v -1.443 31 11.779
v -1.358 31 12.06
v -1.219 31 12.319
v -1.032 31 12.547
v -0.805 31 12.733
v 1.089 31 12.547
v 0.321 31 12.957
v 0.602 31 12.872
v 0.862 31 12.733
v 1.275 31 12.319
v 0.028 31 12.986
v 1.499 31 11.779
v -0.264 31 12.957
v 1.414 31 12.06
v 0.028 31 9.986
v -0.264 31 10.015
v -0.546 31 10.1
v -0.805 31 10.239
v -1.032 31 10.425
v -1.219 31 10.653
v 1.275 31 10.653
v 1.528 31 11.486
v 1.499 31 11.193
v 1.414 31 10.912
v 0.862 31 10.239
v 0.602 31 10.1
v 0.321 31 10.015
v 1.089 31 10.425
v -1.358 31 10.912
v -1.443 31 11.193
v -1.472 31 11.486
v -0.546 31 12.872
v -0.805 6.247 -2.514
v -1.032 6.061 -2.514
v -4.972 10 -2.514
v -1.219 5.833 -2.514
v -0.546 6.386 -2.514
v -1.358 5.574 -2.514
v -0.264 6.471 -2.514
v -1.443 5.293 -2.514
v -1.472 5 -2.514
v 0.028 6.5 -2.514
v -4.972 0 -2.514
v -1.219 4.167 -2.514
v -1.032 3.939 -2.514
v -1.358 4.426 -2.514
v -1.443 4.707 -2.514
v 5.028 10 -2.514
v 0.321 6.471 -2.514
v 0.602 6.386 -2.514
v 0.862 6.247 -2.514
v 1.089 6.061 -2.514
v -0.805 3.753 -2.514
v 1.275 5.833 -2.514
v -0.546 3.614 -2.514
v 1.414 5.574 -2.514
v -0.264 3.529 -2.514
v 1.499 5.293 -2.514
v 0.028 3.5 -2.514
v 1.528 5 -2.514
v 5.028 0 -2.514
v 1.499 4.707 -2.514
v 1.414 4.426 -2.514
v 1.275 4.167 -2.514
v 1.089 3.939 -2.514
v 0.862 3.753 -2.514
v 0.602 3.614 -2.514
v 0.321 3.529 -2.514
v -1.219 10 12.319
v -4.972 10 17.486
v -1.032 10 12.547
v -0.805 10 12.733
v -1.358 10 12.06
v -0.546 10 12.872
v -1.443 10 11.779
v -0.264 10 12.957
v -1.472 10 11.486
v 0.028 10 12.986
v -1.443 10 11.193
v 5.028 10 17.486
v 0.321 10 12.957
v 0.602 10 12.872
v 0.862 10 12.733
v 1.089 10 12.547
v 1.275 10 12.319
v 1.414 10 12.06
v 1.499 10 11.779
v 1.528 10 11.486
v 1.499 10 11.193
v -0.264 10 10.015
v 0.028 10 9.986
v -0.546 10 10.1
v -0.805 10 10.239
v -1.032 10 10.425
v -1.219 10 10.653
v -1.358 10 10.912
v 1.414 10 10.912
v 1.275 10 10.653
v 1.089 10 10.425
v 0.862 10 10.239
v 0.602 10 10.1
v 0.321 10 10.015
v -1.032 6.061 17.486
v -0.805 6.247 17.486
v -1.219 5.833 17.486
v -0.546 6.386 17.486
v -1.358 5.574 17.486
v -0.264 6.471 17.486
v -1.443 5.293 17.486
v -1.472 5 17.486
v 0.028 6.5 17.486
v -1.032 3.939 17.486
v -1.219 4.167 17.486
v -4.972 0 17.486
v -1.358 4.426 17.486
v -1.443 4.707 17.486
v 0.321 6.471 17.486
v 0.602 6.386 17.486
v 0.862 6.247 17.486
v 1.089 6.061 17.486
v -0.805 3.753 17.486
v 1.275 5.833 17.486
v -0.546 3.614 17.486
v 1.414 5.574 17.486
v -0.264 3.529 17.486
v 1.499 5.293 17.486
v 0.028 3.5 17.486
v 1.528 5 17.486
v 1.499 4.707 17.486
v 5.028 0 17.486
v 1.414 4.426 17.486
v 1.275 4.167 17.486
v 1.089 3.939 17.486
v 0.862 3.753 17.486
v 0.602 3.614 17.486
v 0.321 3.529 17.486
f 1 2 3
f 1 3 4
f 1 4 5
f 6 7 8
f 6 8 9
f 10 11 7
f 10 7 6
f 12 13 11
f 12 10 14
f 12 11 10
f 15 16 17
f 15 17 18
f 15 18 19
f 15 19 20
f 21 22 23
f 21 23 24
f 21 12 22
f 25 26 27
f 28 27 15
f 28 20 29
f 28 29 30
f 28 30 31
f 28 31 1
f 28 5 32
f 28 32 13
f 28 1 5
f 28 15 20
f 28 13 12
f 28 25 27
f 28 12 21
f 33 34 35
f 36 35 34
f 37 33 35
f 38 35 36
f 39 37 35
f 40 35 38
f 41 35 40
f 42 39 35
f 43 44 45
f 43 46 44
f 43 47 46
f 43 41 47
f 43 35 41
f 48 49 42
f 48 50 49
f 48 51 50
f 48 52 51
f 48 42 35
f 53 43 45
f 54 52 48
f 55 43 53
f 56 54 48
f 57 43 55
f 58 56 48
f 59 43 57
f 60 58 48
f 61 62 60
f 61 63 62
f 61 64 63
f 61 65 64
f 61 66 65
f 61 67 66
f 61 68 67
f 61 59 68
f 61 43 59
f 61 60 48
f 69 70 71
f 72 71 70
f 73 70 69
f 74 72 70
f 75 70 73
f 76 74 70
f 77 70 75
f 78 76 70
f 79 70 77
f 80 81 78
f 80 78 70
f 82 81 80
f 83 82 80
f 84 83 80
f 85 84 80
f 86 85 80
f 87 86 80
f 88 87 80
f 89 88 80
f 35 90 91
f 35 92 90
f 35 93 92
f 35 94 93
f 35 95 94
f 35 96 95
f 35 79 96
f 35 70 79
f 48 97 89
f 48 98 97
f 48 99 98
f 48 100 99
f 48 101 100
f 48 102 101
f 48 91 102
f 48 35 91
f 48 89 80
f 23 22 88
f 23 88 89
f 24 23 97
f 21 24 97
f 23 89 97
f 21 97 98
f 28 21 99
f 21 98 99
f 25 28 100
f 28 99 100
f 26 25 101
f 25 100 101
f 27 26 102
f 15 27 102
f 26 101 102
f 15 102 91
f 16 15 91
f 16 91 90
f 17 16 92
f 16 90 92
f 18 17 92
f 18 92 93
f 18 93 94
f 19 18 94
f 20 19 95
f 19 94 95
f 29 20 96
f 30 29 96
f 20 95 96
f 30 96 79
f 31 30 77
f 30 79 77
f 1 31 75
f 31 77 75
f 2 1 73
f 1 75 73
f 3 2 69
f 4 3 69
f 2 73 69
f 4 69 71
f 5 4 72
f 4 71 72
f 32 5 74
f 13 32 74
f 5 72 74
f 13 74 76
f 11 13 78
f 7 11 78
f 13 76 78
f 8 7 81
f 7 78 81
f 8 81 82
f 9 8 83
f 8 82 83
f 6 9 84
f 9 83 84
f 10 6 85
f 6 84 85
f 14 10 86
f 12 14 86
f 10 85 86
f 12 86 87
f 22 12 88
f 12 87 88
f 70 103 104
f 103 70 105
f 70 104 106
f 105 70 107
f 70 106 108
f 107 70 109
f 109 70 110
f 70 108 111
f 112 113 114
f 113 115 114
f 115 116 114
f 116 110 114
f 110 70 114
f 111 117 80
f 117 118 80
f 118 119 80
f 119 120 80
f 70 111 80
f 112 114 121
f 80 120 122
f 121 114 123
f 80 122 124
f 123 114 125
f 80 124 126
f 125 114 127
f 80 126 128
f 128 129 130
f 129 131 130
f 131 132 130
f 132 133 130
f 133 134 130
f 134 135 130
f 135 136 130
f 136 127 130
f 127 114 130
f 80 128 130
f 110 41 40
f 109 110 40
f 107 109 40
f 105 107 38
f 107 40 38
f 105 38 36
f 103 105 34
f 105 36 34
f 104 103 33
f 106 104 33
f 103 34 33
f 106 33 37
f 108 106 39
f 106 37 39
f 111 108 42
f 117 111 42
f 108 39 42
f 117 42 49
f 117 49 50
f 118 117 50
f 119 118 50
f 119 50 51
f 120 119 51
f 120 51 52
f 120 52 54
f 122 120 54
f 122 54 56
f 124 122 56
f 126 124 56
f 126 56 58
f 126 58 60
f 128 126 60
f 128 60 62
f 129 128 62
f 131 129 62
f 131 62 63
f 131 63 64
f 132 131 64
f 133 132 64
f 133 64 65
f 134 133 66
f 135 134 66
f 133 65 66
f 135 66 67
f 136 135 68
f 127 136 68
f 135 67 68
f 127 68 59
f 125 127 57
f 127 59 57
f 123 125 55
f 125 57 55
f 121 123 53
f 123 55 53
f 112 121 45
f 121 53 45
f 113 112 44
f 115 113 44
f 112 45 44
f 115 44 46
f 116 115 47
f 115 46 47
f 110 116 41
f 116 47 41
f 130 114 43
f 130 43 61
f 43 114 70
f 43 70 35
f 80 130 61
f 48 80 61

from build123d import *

# Parameters (mm, degrees)
SKETCH1_W           = 10
SKETCH1_H           = 20
BOSS_EXTRUDE1_DEPTH = 10
SKETCH3_R           = 1.5
CUT_EXTRUDE1_DEPTH  = 21
SKETCH2_R           = 1.5
BOSS_EXTRUDE2_DEPTH = 21


with BuildPart() as part:
    # Sketch1 → Boss-Extrude1 (new body)
    with BuildSketch(Plane(origin=(0, 0, 0), x_dir=(1, 0, 0), z_dir=(0, 1, 0))):
        with Locations((0.028248588, -7.485875706)):
            Rectangle(SKETCH1_W, SKETCH1_H)
    extrude(amount=BOSS_EXTRUDE1_DEPTH)

    # Sketch3 → Cut-Extrude1 (cut)
    with BuildSketch(Plane(origin=(0, 0, -2.514124294), x_dir=(-1, 0, 0), z_dir=(0, 0, -1))):
        with Locations((-0.028248588, 5)):
            Circle(SKETCH3_R)
    extrude(amount=-CUT_EXTRUDE1_DEPTH, mode=Mode.SUBTRACT)

    # Sketch2 → Boss-Extrude2 (add)
    with BuildSketch(Plane(origin=(0, 10, 0), x_dir=(1, 0, 0), z_dir=(0, 1, 0))):
        with Locations((0.028248588, -11.485875706)):
            Circle(SKETCH2_R)
    extrude(amount=BOSS_EXTRUDE2_DEPTH)


solid = part.part
